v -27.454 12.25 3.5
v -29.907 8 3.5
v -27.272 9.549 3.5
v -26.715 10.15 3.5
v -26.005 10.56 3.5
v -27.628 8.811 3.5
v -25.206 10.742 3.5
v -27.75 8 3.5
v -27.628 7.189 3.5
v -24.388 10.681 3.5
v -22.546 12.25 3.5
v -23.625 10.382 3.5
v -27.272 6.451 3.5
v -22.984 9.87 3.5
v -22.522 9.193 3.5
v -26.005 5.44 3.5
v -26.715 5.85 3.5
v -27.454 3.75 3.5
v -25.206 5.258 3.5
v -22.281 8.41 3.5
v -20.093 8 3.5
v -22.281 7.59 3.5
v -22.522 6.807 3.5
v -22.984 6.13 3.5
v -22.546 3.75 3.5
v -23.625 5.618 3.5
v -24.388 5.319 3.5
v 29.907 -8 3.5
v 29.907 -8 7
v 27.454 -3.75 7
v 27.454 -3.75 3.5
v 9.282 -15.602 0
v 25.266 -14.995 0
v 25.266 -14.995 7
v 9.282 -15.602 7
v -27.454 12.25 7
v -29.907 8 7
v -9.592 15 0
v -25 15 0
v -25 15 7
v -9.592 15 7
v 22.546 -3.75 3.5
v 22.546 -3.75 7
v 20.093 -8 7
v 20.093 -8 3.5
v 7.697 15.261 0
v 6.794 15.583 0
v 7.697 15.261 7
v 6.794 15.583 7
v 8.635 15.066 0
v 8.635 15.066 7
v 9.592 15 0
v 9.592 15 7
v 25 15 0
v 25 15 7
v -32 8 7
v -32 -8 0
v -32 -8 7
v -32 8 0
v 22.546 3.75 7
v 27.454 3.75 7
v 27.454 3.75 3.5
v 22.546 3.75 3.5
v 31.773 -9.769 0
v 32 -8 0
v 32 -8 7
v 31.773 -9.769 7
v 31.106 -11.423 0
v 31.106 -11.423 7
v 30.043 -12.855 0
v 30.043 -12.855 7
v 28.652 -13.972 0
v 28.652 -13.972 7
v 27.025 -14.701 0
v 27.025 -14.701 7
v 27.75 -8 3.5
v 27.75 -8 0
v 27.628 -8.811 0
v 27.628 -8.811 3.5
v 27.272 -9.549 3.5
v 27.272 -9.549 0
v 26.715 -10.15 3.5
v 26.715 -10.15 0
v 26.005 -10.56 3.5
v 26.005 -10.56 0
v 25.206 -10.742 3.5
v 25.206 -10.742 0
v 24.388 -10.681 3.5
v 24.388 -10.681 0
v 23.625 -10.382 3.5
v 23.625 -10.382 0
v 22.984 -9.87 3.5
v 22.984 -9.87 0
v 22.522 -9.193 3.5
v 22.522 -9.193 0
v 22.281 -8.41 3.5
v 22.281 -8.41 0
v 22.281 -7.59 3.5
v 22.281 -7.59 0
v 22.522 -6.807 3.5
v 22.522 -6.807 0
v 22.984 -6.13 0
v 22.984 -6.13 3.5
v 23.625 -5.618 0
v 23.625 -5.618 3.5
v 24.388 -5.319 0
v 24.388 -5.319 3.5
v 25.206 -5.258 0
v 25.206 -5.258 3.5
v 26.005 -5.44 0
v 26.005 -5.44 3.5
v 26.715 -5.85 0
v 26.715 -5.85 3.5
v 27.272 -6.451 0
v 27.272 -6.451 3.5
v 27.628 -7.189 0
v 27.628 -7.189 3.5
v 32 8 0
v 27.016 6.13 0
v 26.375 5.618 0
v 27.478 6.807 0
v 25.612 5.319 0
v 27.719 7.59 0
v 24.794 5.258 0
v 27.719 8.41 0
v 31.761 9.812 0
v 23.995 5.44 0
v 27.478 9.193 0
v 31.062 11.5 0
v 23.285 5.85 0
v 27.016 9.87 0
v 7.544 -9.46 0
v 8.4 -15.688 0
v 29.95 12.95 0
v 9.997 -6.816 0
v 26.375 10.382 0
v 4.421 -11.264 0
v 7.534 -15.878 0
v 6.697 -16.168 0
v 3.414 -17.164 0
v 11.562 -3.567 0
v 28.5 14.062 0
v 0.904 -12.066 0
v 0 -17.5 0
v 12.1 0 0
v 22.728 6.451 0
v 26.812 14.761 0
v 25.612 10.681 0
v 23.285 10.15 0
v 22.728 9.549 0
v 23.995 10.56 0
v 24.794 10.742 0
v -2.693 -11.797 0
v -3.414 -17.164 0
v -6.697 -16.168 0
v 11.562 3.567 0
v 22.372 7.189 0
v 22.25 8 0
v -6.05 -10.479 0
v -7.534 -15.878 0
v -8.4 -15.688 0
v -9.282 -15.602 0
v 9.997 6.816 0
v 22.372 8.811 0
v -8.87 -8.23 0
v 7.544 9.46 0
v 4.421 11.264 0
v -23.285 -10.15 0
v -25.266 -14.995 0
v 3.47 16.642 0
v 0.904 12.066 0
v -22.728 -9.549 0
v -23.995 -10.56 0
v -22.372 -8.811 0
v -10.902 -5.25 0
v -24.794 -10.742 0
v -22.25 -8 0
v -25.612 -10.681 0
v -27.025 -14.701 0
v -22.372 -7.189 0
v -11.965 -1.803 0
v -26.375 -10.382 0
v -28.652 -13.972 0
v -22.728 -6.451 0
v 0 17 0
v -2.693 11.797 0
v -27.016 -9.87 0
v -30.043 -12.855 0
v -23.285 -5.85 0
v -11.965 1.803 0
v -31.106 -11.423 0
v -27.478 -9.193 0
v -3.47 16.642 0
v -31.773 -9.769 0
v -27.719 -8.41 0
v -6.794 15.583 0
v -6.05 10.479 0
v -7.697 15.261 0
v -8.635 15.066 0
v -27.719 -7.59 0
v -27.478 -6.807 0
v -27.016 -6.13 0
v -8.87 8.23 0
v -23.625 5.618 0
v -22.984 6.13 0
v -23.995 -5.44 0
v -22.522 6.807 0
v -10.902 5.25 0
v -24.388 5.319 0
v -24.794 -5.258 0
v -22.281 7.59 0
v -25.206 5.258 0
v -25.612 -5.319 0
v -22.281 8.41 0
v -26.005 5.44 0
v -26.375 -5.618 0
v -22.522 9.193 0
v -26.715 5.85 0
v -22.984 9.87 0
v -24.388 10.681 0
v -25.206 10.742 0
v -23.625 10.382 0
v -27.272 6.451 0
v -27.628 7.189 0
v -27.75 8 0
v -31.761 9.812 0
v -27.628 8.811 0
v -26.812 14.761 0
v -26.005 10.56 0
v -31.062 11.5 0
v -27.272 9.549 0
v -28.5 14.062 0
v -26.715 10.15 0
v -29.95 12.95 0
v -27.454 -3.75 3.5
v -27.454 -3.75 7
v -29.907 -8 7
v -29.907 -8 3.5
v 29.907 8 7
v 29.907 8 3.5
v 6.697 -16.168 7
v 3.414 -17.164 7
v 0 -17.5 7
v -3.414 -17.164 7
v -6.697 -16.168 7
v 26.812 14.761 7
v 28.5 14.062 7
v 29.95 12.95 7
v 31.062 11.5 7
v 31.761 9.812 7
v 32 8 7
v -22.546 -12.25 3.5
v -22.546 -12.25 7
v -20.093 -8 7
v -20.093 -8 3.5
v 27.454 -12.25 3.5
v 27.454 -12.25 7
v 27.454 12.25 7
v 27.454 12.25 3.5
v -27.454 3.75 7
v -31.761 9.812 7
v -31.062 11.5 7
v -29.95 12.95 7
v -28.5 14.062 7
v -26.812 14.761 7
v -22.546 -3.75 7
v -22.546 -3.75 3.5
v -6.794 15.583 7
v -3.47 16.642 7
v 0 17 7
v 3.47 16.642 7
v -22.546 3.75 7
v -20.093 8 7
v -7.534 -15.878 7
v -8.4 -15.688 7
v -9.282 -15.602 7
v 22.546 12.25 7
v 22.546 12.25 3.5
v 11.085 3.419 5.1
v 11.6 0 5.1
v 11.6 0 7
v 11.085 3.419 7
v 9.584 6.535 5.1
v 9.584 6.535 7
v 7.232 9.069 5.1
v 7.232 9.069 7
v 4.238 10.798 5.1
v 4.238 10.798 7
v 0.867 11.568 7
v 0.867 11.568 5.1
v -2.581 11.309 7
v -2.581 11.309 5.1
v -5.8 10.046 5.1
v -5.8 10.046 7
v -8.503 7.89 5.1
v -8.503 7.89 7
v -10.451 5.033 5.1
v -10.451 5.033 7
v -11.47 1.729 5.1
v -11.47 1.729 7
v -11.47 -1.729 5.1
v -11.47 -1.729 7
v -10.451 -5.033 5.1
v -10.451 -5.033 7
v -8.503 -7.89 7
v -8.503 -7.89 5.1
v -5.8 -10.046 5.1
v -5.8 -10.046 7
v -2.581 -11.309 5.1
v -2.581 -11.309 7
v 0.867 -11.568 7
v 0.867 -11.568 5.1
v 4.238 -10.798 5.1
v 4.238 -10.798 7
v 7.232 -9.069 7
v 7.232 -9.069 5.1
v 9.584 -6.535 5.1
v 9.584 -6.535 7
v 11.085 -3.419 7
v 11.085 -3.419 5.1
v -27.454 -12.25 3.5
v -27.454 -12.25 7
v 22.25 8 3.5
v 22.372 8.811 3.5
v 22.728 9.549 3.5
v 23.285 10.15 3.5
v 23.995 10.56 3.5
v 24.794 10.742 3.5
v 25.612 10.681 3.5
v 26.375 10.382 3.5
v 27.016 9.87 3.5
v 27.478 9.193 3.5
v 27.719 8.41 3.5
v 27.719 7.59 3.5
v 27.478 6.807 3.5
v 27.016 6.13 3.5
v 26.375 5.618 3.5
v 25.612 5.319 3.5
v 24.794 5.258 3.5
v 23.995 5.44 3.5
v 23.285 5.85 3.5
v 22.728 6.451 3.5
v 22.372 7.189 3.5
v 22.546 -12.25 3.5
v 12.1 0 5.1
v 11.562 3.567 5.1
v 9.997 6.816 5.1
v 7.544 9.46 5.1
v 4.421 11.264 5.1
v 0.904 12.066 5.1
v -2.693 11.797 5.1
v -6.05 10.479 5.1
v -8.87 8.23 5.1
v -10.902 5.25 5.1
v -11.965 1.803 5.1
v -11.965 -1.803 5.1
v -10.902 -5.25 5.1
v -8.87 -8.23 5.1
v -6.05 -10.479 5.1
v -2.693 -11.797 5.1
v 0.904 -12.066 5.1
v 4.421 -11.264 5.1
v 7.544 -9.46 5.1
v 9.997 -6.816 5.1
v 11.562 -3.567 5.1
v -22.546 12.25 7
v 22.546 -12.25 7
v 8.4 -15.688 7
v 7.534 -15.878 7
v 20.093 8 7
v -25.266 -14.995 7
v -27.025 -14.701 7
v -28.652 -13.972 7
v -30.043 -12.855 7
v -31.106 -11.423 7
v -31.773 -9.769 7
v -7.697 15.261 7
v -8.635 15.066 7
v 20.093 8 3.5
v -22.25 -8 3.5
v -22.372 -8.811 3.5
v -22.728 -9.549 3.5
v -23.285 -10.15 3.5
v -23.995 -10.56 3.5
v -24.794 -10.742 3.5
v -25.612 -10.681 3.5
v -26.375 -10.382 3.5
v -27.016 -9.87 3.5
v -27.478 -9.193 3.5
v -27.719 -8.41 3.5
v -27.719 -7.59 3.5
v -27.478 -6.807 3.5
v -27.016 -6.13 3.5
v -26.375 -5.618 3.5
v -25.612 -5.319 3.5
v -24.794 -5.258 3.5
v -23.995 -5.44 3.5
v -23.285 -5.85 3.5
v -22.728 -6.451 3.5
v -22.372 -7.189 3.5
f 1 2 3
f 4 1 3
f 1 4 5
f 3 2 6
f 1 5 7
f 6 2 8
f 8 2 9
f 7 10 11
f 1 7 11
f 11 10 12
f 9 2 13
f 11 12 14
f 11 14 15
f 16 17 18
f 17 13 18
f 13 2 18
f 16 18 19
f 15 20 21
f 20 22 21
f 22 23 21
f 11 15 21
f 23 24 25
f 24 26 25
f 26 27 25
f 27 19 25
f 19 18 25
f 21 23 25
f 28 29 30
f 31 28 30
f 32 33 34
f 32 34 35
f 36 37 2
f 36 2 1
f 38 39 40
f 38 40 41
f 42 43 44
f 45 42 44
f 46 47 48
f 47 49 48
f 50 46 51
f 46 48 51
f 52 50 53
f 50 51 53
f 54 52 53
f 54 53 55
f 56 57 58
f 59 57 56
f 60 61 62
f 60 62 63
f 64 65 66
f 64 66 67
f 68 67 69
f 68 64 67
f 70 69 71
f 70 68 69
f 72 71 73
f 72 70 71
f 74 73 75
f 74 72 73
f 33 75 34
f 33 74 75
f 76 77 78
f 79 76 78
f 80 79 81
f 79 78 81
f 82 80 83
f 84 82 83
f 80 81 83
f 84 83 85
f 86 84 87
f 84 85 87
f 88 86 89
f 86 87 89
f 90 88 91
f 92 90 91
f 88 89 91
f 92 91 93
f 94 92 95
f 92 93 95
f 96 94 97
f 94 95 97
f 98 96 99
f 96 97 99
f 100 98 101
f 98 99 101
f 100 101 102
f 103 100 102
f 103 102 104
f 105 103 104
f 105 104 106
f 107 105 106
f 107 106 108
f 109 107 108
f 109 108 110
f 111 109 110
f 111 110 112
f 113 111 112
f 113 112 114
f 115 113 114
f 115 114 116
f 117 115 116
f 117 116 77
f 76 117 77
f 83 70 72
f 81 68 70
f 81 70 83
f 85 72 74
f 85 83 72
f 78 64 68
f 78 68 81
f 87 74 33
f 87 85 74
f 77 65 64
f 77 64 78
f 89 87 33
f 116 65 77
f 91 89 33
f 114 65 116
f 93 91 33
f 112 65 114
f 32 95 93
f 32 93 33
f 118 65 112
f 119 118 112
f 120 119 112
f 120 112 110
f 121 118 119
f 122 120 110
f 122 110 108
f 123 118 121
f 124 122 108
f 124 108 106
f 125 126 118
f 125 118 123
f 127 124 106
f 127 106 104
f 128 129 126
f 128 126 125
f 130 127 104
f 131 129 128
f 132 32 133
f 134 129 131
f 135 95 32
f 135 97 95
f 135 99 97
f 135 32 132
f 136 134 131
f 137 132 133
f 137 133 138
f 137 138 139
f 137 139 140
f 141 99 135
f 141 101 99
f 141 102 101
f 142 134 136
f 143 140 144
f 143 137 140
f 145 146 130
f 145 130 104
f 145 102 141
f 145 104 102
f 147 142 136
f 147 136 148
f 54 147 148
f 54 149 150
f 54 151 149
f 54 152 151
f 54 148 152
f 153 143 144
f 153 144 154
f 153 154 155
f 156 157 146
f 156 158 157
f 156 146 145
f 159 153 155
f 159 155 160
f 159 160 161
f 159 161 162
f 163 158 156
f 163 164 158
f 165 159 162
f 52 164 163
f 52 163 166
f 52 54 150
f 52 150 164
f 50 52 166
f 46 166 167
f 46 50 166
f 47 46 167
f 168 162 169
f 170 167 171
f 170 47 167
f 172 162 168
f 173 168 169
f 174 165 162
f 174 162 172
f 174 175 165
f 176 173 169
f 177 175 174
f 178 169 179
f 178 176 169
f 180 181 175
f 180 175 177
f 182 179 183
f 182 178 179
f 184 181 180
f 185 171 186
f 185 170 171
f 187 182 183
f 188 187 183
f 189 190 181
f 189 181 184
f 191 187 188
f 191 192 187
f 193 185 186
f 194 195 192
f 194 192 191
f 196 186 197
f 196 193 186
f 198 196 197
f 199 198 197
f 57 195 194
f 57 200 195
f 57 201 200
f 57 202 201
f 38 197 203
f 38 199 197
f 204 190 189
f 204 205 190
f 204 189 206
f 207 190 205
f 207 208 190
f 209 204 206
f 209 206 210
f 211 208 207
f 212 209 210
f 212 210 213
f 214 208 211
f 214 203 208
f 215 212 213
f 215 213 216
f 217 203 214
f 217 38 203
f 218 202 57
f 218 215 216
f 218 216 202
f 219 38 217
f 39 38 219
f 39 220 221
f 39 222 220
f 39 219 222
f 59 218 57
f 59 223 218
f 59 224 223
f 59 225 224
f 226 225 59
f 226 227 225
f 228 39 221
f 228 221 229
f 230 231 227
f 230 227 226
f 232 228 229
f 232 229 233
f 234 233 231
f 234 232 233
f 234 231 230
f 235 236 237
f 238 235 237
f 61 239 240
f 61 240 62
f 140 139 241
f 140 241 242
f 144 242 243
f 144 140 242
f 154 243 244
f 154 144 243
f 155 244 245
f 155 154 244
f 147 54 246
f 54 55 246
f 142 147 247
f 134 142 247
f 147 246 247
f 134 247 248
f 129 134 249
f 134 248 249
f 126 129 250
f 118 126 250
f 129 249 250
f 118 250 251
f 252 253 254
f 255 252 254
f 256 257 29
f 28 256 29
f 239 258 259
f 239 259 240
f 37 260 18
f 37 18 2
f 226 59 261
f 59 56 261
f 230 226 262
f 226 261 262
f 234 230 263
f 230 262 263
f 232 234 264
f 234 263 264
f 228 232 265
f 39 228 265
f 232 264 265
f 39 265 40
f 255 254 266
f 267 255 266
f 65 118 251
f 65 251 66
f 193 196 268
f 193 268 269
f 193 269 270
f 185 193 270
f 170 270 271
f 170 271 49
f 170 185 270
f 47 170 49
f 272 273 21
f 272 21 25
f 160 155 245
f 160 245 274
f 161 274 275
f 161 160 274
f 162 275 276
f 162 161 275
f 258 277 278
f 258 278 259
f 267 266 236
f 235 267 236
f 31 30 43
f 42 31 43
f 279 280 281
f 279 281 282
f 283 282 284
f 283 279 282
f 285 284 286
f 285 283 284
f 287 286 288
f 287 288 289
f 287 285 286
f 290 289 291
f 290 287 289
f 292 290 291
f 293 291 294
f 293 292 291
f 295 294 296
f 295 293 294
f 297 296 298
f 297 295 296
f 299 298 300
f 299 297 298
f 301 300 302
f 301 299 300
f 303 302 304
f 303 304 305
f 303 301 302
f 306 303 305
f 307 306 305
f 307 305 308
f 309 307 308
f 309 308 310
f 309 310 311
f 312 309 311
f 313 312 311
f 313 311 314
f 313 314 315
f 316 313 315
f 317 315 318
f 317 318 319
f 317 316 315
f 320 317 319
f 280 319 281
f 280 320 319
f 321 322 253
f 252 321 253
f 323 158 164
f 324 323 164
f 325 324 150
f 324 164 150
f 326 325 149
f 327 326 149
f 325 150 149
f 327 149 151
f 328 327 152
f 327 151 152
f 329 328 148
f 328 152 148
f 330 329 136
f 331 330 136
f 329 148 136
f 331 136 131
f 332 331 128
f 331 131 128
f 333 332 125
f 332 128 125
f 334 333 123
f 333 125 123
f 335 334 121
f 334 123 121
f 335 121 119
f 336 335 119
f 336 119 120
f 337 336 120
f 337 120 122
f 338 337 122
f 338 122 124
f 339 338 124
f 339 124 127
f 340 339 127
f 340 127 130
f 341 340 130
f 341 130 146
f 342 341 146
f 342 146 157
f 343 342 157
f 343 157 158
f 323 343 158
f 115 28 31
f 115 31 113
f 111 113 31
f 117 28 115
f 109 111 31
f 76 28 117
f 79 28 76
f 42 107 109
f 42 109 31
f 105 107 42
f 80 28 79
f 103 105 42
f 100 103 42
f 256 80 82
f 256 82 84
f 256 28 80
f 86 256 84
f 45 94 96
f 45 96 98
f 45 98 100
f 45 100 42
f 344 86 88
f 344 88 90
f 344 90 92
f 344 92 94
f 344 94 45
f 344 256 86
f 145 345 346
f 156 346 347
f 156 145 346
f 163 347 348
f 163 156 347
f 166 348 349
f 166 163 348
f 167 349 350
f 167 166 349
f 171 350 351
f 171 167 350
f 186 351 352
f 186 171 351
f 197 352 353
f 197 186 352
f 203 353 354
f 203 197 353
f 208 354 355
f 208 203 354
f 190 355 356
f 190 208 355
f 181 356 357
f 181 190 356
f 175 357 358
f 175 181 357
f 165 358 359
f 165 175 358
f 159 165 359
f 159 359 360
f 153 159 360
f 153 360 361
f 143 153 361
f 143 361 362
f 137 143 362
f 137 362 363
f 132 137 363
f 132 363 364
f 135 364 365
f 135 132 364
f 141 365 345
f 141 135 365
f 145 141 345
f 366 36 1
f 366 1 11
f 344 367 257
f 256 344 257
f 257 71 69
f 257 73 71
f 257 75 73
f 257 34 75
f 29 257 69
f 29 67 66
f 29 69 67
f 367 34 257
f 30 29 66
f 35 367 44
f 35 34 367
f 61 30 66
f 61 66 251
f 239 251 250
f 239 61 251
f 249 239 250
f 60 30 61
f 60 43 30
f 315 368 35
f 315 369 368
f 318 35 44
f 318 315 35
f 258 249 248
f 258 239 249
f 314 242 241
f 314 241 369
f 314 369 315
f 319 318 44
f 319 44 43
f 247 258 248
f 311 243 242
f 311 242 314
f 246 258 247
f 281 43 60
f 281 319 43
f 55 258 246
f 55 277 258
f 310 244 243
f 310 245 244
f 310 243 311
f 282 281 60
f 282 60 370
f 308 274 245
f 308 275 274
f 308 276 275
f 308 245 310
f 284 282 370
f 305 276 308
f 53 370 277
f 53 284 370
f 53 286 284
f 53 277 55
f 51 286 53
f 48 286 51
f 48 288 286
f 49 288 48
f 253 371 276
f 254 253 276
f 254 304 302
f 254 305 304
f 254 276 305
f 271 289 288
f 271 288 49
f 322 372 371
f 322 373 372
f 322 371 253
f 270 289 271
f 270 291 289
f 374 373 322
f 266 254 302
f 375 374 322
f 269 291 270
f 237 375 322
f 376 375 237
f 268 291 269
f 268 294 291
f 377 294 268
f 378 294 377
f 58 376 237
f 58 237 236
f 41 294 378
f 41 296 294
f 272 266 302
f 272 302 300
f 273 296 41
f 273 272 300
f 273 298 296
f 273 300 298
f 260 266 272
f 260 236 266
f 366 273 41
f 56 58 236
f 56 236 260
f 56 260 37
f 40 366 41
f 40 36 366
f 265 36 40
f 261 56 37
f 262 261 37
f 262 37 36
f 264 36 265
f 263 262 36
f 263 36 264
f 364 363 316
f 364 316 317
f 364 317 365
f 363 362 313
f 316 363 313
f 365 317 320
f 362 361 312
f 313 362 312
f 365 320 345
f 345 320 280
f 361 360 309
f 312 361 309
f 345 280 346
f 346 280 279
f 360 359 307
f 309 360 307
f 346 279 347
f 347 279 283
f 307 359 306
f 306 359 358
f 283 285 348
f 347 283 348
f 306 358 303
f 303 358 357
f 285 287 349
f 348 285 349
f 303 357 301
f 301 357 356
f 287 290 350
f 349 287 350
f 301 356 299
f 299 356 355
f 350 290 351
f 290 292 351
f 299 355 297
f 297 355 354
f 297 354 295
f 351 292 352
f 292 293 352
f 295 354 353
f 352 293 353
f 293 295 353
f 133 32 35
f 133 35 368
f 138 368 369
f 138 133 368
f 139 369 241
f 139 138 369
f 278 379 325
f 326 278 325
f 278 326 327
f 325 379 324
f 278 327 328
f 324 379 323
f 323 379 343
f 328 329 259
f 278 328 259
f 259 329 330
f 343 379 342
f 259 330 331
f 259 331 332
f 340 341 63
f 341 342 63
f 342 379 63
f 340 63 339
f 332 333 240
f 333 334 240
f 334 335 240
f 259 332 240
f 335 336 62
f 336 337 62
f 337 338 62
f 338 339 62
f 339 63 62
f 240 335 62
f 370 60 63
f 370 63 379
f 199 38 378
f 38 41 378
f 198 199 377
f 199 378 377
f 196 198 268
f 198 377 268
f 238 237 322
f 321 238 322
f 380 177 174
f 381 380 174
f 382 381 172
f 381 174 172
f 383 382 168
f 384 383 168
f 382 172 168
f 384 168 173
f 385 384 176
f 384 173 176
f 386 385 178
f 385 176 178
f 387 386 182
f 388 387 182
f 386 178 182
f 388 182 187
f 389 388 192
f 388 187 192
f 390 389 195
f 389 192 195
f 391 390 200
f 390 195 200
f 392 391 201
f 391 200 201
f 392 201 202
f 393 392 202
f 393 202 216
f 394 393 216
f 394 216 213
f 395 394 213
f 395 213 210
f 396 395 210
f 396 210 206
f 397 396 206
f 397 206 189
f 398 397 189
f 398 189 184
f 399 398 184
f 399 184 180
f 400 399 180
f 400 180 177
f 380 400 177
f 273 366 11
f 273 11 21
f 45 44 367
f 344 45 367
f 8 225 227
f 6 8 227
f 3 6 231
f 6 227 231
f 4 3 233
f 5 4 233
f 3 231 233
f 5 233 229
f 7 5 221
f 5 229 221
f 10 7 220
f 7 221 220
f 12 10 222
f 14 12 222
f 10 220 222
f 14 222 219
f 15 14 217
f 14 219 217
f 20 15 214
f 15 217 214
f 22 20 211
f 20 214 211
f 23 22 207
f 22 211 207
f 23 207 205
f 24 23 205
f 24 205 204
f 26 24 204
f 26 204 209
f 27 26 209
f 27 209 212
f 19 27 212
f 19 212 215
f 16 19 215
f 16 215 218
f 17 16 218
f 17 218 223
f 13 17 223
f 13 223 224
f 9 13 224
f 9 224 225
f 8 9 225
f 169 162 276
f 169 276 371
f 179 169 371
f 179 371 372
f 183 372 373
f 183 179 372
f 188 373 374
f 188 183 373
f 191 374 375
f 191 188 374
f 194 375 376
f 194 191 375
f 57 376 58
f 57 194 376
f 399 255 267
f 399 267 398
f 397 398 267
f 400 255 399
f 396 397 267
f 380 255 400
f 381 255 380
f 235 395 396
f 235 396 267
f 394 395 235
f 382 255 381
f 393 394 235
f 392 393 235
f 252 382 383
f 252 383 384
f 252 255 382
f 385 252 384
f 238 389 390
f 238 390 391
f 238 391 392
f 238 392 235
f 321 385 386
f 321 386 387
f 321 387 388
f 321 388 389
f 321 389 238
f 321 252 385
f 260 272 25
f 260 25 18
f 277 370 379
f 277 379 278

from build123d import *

# Parameters (mm, degrees)
SKETCH_1_R          = 12.1
EXTRUDE_1_DEPTH     = 7
FILLET_3_R          = 7
EXTRUDE_START       = -1.9
SKETCH_7_R          = 12.1
SKETCH_7_R_2        = 11.6
EXTRUDE_2_DEPTH     = 1.9
HOLE_WIZARD_M53_D   = 5.5
HOLE_WIZARD_M54_D   = 5.5
CUT_EXTRUDE_1_DEPTH = 3.5


with BuildPart() as part:
    # Эскиз1 → Бобышка-Вытянуть1 (new body)
    with BuildSketch(Plane.XY):
        with BuildLine():
            Line((-9.282257481, -15.602398743), (-25.265839773, -14.994950265))
            ThreePointArc((-25.265839773, -14.994950265), (-30.042860221, -12.854849204), (-32, -8))
            Line((-32, -8), (-32, 15))
            Line((-32, 15), (-8, 15))
            ThreePointArc((-8, 15), (0, 17), (8, 15))
            Line((8, 15), (32, 15))
            Line((32, 15), (32, -8))
            ThreePointArc((32, -8), (30.042860221, -12.854849204), (25.265839773, -14.994950265))
            Line((25.265839773, -14.994950265), (9.282257481, -15.602398743))
            ThreePointArc((9.282257481, -15.602398743), (7.964469385, -15.770214084), (6.696960066, -16.167891819))
            ThreePointArc((6.696960066, -16.167891819), (0, -17.5), (-6.696960066, -16.167891819))
            ThreePointArc((-6.696960066, -16.167891819), (-7.964469385, -15.770214084), (-9.282257481, -15.602398743))
        make_face()
        Circle(SKETCH_1_R, mode=Mode.SUBTRACT)
    extrude(amount=EXTRUDE_1_DEPTH)

    # Скругление3
    fillet_3_edges = [part.edges().sort_by_distance(p)[0] for p in [
        (-32, 15, 3.5),
        (-8, 15, 3.5),
        (8, 15, 3.5),
        (32, 15, 3.5),
    ]]
    fillet(fillet_3_edges, radius=FILLET_3_R)

    # Эскиз7 → Бобышка-Вытянуть2 (add)
    with BuildSketch(Plane.XY.offset(7).offset(EXTRUDE_START)):
        with Locations(Location((0, 0, 0), (0, 0, 90))):
            Circle(SKETCH_7_R)
        Circle(SKETCH_7_R_2, mode=Mode.SUBTRACT)
    extrude(amount=EXTRUDE_2_DEPTH)

    # Отверстие с зазором M53 (through all)
    with Locations(Plane.XY.offset(7)):
        with Locations((-25, 8), (25, 8)):
            Hole(HOLE_WIZARD_M53_D / 2)

    # Отверстие с зазором M54 (through all)
    with Locations(Plane(origin=(-20.850360387, 7.199740636, 7), x_dir=(-1, 0, 0), z_dir=(0, 0, 1))):
        with Locations((-45.850360387, 15.199740636), (4.149639613, 15.199740636)):
            Hole(HOLE_WIZARD_M54_D / 2)

    # Эскиз18 → Вырез-Вытянуть1 (cut)
    with BuildSketch(Plane(origin=(0, 0, 7), x_dir=(1, 0, 0), z_dir=(0, 0, -1))):
        Polygon((20.092522712, -8), (22.546261356, -12.25), (27.453738644, -12.25), (29.907477288, -8), (27.453738644, -3.75), (22.546261356, -3.75), align=None)
        Polygon((-27.453738644, -3.75), (-29.907477288, -8), (-27.453738644, -12.25), (-22.546261356, -12.25), (-20.092522712, -8), (-22.546261356, -3.75), align=None)
        Polygon((20.092522712, 8), (22.546261356, 12.25), (27.453738644, 12.25), (29.907477288, 8), (27.453738644, 3.75), (22.546261356, 3.75), align=None)
        Polygon((-22.546261356, 12.25), (-20.092522712, 8), (-22.546261356, 3.75), (-27.453738644, 3.75), (-29.907477288, 8), (-27.453738644, 12.25), align=None)
    extrude(amount=CUT_EXTRUDE_1_DEPTH, mode=Mode.SUBTRACT)


solid = part.part
